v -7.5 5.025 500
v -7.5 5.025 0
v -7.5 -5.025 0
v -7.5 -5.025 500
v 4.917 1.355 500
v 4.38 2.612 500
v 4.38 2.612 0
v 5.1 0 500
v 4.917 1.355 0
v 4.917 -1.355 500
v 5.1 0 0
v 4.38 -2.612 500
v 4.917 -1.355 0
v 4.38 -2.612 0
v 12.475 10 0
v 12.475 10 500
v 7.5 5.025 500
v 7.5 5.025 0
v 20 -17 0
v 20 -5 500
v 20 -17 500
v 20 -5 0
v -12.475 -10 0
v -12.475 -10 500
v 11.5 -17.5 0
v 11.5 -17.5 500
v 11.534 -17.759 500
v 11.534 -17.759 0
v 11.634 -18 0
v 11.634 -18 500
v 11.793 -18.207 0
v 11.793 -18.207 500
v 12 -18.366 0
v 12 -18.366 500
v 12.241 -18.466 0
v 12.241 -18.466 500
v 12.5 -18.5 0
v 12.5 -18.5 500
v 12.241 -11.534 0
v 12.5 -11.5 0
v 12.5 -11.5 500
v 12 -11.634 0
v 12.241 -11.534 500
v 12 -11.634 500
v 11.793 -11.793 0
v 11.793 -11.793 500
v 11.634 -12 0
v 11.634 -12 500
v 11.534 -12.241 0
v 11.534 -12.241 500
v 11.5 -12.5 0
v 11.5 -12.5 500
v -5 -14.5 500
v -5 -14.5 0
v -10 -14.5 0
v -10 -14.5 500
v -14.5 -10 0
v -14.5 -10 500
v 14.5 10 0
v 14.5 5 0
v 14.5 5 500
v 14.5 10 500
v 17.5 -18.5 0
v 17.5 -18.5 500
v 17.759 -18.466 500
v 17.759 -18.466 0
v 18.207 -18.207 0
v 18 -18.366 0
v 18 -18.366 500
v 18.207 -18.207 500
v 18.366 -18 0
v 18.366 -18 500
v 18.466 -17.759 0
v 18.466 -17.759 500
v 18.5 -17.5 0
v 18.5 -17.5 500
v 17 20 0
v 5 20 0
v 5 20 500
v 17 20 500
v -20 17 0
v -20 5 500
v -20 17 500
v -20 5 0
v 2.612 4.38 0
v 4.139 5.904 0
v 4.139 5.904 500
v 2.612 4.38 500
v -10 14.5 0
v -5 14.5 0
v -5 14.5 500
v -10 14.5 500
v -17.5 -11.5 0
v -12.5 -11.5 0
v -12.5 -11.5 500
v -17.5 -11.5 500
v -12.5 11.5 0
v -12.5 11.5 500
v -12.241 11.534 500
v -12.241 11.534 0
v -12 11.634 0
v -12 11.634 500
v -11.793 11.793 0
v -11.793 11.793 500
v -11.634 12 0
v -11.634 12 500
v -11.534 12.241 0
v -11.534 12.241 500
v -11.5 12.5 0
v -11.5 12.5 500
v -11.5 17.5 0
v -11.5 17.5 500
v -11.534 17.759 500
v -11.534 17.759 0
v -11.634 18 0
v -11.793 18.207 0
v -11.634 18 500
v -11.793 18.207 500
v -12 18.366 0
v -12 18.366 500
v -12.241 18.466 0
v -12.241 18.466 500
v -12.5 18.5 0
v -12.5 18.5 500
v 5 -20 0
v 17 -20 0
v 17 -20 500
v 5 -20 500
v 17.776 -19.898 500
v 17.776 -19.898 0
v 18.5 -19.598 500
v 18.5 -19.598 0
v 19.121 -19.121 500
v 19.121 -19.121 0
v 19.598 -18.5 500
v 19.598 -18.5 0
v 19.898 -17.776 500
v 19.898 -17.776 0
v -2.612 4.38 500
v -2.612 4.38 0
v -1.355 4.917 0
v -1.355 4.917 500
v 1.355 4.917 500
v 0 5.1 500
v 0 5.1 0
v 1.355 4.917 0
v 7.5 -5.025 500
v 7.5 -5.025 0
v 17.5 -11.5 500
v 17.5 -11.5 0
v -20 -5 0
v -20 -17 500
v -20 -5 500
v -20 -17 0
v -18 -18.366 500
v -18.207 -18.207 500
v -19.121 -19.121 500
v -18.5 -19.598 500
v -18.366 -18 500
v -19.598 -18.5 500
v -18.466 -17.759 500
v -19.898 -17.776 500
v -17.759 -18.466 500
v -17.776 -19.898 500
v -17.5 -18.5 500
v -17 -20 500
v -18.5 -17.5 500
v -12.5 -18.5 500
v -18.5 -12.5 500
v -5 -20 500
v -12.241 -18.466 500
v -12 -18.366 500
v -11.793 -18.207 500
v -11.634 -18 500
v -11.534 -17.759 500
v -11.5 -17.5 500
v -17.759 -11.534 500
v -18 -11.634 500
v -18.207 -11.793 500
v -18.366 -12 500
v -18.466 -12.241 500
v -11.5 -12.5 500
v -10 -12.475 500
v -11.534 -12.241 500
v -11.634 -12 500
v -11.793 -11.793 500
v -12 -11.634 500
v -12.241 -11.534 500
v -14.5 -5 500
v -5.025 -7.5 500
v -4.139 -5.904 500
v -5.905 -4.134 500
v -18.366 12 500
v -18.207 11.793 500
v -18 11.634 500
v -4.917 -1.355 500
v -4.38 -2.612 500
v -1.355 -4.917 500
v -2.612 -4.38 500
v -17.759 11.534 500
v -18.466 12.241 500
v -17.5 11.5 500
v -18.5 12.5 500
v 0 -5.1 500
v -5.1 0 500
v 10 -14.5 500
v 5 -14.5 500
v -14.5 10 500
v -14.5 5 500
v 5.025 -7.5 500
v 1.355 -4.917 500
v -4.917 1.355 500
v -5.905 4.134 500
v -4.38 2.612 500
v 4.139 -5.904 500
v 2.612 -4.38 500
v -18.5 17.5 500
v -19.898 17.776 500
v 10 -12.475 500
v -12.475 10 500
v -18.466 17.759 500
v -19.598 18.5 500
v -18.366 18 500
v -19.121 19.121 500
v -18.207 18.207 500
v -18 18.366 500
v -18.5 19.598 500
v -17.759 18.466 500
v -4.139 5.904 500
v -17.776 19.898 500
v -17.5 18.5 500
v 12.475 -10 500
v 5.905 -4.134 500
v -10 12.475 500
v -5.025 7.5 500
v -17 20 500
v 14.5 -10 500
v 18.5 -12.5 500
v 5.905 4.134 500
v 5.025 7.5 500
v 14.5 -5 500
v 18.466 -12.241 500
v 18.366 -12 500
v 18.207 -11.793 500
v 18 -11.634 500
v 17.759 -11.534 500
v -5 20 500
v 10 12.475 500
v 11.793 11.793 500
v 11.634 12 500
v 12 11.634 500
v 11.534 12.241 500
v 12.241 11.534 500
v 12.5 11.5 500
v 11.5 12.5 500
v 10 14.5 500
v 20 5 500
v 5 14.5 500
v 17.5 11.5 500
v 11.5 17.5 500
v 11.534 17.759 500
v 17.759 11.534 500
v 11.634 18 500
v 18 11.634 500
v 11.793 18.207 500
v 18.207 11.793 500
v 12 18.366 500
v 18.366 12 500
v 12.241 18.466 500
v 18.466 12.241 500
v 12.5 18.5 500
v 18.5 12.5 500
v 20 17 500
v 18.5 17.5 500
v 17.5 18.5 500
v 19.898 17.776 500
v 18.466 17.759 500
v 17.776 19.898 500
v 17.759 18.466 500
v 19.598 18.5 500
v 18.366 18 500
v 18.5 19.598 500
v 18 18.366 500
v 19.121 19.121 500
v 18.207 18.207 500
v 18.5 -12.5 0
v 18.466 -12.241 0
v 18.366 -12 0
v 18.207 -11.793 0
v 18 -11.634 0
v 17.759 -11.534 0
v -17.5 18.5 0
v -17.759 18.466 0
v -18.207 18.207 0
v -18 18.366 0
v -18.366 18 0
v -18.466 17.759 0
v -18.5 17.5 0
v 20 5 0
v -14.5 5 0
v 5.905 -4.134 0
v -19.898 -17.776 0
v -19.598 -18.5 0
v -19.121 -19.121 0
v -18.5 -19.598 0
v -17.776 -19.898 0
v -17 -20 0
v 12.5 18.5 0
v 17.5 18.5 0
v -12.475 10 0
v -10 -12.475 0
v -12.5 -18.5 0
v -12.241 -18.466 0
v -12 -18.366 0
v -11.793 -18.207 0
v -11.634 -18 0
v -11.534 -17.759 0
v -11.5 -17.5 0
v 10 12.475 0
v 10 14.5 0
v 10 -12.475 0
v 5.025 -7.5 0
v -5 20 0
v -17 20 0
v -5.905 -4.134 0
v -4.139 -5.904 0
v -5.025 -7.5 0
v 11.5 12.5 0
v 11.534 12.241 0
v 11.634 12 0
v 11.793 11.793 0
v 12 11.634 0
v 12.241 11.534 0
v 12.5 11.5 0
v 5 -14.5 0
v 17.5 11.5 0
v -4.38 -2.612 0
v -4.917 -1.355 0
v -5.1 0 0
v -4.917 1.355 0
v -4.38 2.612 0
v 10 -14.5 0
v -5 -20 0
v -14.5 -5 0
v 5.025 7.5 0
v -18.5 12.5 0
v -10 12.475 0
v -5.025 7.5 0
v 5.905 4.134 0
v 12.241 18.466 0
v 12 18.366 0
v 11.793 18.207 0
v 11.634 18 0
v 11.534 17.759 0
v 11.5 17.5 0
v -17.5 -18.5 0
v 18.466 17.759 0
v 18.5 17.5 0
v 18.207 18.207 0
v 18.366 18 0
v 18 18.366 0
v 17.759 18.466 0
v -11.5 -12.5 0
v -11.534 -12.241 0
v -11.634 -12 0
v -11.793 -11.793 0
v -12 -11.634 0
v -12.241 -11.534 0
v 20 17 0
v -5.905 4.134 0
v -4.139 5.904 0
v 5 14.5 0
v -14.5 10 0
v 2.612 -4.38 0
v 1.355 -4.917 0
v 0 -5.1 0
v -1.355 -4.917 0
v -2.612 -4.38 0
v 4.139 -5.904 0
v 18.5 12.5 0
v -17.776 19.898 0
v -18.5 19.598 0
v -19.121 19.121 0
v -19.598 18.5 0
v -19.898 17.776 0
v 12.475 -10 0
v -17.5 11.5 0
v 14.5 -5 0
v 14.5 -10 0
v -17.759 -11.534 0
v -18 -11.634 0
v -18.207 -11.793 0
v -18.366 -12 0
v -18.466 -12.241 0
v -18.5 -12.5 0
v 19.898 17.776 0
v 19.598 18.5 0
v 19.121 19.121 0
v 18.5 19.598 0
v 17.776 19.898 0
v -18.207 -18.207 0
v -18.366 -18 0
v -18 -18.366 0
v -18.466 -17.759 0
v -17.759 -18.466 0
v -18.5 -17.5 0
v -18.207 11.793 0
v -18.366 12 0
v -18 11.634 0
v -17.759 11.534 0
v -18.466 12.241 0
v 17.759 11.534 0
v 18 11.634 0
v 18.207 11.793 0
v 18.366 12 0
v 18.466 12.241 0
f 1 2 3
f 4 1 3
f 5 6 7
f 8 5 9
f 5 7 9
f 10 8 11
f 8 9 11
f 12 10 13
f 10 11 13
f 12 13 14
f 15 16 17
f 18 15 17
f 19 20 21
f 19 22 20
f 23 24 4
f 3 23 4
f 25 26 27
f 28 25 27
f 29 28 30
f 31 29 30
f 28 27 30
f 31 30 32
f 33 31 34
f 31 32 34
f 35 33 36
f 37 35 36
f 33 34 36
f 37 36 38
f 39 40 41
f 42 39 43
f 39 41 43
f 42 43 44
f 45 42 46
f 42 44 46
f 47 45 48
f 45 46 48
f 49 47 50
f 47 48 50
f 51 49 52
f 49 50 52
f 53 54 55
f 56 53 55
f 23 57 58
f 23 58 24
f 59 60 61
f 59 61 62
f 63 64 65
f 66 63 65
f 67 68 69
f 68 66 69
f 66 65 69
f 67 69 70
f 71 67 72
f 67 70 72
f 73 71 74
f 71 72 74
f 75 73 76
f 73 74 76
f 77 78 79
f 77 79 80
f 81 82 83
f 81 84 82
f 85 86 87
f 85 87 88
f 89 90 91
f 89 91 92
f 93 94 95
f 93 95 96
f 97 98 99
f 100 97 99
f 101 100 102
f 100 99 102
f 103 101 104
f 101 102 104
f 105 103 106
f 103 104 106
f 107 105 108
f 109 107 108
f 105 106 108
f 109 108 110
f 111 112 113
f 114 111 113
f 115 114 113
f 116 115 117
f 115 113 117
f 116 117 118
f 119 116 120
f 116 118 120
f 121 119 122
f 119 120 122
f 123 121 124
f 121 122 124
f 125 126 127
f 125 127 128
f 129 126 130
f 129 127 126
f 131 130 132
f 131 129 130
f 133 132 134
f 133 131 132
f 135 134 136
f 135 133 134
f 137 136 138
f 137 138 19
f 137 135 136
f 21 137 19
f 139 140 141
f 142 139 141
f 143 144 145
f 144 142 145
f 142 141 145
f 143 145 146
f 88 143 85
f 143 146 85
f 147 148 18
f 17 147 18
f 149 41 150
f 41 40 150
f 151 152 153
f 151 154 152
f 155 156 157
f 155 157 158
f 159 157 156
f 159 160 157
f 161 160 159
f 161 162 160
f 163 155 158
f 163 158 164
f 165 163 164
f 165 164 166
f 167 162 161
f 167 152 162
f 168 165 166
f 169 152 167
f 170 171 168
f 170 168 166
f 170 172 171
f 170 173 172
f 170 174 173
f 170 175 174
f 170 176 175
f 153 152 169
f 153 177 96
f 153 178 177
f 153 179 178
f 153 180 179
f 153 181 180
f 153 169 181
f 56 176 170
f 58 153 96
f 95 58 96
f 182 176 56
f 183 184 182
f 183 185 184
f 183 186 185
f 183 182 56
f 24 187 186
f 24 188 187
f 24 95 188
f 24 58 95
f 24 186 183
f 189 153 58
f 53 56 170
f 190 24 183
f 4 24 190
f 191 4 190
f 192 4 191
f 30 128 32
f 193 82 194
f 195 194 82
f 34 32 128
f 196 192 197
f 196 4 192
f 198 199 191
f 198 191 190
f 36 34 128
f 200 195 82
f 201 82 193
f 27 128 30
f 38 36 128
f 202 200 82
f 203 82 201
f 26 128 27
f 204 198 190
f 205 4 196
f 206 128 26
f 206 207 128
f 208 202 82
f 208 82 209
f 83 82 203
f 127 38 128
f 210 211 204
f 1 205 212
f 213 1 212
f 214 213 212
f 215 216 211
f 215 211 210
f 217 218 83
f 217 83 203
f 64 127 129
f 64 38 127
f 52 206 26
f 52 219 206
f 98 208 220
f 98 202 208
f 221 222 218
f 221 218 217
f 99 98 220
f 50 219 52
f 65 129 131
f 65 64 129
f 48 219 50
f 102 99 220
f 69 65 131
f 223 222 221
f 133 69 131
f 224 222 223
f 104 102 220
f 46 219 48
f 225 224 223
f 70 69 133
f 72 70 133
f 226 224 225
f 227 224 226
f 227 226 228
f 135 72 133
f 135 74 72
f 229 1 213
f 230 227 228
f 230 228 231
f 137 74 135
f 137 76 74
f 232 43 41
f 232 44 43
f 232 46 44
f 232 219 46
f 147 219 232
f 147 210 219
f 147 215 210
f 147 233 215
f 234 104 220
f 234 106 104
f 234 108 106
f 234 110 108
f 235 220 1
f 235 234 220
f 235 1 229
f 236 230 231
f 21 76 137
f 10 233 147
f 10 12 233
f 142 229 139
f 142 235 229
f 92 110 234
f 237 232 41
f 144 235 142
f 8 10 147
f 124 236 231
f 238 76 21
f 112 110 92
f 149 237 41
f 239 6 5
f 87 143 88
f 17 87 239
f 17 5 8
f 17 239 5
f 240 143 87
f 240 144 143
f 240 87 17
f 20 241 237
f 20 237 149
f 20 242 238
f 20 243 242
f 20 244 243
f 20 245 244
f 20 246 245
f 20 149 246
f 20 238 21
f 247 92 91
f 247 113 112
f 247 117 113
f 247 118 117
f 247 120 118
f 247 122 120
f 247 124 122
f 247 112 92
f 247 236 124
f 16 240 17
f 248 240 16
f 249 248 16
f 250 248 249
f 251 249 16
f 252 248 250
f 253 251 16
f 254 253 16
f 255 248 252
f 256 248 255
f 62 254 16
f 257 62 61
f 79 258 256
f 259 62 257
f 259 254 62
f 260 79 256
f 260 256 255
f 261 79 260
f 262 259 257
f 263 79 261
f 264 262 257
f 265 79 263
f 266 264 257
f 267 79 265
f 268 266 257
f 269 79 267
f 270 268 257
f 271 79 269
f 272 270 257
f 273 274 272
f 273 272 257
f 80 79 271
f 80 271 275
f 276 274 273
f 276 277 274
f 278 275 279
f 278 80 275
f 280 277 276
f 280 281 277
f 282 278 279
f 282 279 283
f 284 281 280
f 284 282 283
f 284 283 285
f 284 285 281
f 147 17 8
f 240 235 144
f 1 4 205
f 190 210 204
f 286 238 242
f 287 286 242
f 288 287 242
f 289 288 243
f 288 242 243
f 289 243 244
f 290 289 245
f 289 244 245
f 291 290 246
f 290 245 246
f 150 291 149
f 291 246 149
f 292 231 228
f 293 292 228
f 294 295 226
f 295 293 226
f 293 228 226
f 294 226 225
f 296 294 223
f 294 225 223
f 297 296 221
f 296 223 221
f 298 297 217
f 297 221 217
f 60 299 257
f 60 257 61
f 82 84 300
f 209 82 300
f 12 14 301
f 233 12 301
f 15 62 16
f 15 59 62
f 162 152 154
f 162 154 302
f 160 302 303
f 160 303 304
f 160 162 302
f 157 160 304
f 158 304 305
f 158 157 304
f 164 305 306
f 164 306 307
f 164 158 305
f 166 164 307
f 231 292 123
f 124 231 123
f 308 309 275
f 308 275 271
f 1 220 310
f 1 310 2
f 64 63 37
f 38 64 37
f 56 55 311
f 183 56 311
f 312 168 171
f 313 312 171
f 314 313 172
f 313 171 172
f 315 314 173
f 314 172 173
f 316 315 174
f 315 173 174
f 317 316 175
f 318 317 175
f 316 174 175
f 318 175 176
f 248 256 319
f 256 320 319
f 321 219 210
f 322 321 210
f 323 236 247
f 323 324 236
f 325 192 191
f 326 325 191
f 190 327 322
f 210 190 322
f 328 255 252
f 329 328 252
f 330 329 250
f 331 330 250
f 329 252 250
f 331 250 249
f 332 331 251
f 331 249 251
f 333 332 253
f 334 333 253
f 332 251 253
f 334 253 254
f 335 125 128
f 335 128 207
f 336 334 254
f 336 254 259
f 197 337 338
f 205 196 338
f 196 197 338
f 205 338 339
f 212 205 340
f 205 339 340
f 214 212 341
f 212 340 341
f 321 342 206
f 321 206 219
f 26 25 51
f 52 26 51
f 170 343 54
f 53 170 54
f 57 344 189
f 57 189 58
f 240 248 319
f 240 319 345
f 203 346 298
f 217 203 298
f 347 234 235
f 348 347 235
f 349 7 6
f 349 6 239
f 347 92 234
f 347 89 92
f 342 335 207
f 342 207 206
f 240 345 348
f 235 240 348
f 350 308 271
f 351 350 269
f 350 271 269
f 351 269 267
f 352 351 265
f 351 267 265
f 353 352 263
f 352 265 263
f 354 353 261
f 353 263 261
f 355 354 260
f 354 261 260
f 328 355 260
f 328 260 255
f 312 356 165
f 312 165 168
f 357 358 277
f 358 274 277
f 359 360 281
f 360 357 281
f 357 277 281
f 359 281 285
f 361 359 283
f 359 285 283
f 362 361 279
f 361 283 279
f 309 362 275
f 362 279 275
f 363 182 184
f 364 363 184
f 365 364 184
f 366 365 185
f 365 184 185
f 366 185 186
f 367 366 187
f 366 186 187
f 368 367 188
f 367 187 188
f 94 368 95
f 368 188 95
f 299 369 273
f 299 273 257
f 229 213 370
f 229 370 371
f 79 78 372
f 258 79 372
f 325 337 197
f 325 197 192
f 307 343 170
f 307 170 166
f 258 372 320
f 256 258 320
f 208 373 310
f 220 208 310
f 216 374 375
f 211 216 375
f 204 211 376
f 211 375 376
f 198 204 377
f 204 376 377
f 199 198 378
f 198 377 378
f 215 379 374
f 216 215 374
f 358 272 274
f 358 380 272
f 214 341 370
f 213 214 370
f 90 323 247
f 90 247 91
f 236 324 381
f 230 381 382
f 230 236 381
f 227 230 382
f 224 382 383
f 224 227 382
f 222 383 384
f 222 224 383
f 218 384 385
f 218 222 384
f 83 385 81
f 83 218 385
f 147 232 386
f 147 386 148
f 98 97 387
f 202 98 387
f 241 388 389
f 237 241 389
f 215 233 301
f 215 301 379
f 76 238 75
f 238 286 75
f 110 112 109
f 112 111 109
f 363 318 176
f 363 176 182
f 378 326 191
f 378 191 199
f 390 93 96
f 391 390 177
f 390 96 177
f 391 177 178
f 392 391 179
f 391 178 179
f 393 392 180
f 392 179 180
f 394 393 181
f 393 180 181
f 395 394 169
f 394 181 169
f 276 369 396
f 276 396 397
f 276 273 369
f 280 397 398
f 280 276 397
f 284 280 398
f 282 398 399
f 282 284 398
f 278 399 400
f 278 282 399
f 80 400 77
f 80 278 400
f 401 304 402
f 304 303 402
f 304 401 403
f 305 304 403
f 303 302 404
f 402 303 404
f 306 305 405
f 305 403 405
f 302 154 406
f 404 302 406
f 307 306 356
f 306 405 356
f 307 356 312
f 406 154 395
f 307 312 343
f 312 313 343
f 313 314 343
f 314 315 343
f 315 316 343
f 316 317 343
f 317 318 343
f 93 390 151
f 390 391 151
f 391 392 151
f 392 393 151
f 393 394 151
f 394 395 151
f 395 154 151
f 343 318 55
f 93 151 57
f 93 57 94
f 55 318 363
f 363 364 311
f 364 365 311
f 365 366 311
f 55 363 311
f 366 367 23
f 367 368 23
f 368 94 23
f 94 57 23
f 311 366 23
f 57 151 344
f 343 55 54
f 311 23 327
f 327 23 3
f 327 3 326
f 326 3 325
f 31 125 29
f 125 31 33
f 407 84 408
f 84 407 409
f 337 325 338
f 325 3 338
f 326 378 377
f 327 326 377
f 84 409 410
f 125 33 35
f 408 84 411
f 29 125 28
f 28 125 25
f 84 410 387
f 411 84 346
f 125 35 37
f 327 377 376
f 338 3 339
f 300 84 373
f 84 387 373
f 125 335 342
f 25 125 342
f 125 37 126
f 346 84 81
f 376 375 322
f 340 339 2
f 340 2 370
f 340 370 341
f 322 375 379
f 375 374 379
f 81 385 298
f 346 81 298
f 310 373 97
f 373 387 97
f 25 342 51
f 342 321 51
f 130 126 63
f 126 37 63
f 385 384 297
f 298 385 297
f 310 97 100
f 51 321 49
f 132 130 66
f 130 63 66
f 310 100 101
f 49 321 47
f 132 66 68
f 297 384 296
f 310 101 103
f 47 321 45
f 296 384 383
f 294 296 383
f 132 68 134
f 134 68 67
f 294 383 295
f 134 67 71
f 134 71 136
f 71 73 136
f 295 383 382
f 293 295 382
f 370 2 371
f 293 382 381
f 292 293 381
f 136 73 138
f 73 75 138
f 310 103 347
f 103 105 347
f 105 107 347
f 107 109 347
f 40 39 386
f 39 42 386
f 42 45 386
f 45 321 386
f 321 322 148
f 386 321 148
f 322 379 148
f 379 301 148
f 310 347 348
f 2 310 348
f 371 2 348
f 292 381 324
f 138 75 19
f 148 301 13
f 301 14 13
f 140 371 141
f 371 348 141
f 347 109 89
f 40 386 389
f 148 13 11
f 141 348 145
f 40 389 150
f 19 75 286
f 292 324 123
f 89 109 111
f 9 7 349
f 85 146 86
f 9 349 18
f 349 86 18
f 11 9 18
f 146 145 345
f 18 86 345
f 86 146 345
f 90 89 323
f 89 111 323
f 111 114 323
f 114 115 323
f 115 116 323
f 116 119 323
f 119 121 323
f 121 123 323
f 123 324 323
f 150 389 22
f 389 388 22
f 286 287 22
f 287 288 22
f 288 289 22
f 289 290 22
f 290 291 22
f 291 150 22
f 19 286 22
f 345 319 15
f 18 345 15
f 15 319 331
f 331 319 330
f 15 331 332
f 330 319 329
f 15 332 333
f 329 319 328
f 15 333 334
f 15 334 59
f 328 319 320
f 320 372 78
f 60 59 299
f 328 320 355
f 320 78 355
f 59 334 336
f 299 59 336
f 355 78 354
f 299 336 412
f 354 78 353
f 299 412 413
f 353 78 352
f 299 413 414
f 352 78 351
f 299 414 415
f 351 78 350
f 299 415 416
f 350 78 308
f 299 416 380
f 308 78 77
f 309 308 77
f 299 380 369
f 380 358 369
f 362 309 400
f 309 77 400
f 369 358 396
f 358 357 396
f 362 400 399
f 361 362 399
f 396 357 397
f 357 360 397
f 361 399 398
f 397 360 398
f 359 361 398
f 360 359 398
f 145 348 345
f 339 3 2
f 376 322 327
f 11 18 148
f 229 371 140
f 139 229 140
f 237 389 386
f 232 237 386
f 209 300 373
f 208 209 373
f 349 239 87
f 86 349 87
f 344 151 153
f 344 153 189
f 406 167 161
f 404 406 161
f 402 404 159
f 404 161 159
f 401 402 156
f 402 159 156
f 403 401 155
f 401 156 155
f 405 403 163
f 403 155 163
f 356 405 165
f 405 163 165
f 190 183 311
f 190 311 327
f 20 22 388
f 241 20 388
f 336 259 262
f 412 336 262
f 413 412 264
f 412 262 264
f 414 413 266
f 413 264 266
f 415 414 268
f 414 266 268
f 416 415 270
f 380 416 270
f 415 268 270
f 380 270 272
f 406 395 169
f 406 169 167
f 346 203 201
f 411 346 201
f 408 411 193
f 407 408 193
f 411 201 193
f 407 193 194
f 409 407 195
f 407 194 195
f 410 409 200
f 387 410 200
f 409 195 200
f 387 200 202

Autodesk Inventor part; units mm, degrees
ref_plane "YZ Plane" through (0, 0, 0) normal (1, 0, 0) x (0, 1, 0)
ref_plane "XZ Plane" through (0, 0, 0) normal (0, 1, 0) x (-1, 0, 0)
ref_plane "XY Plane" through (0, 0, 0) normal (0, 0, 1) x (1, 0, 0)
sketch "T-Slot 4040 Base" plane through (0, 0, 0) normal (0, 0, 1) x (1, 0, 0)
  line L0 (-28, 0) -> (28, 0) construction
  line L1 (0, -28) -> (0, 28) construction
  circle A0 centre (0, 0) radius 5.1
  line L2 (-7.5, -7.5) -> (7.5, -7.5)
  line L3 (7.5, -7.5) -> (7.5, 7.5)
  line L4 (7.5, 7.5) -> (-7.5, 7.5)
  line L5 (-7.5, 7.5) -> (-7.5, -7.5)
  line L6 (-7.5, -7.5) -> (7.5, 7.5) construction
  line L7 (7.5, -7.5) -> (-7.5, 7.5) construction
  line L8 (-20, 20) -> (20, 20)
  line L9 (20, 20) -> (20, -20)
  line L10 (20, -20) -> (-20, -20)
  line L11 (-20, -20) -> (-20, 20)
  line L12 (-20, 20) -> (20, -20) construction
  line L13 (20, 20) -> (-20, -20) construction
  line L14 (20, 5) -> (14.5, 5)
  line L15 (14.5, 5) -> (14.5, 10)
  line L16 (14.5, 10) -> (12.4749, 10)
  line L17 (12.4749, 10) -> (7.5, 5.0251)
  line L18 (5, 20) -> (5, 14.5)
  line L19 (5, 14.5) -> (10, 14.5)
  line L20 (10, 14.5) -> (10, 12.4749)
  line L21 (10, 12.4749) -> (5.0251, 7.5)
  line L22 (18.5, 18.5) -> (11.5, 18.5)
  line L23 (11.5, 18.5) -> (11.5, 11.5)
  line L24 (11.5, 11.5) -> (18.5, 11.5)
  line L25 (18.5, 11.5) -> (18.5, 18.5)
  line L26 (18.5, 18.5) -> (11.5, 11.5) construction
  line L27 (11.5, 18.5) -> (18.5, 11.5) construction
  line L28 (3.0732, 1.3088) -> (4.38, 2.6125) construction
  line L29 (5.905, 4.1338) -> (4.1393, 5.9037)
  line L30 (4.1393, 5.9037) -> (2.6122, 4.3802)
  line L31 (1.3075, 3.0787) -> (3.0732, 1.3088) construction
  line L32 (3.0732, 1.3088) -> (4.1393, 5.9037) construction
  line L33 (5.905, 4.1338) -> (1.3075, 3.0787) construction
  line L34 (4.38, 2.6125) -> (5.905, 4.1338)
  line L35 (2.6122, 4.3802) -> (1.3075, 3.0787) construction
  line L36 (-20, 5) -> (-14.5, 5)
  line L37 (-14.5, 5) -> (-14.5, 10)
  line L38 (-14.5, 10) -> (-12.4749, 10)
  line L39 (-12.4749, 10) -> (-7.5, 5.0251)
  line L40 (-5, 20) -> (-5, 14.5)
  line L41 (-5, 14.5) -> (-10, 14.5)
  line L42 (-10, 14.5) -> (-10, 12.4749)
  line L43 (-10, 12.4749) -> (-5.0251, 7.5)
  line L44 (-18.5, 18.5) -> (-11.5, 18.5)
  line L45 (-11.5, 18.5) -> (-11.5, 11.5)
  line L46 (-11.5, 11.5) -> (-18.5, 11.5)
  line L47 (-18.5, 11.5) -> (-18.5, 18.5)
  line L48 (-5.905, 4.1338) -> (-4.1393, 5.9037)
  line L49 (-4.1393, 5.9037) -> (-2.6122, 4.3802)
  line L50 (-4.38, 2.6125) -> (-5.905, 4.1338)
  line L51 (7.5, -7.5) -> (-7.5, -7.5)
  line L52 (20, -5) -> (14.5, -5)
  line L53 (14.5, -5) -> (14.5, -10)
  line L54 (14.5, -10) -> (12.4749, -10)
  line L55 (12.4749, -10) -> (7.5, -5.0251)
  line L56 (5, -20) -> (5, -14.5)
  line L57 (5, -14.5) -> (10, -14.5)
  line L58 (10, -14.5) -> (10, -12.4749)
  line L59 (10, -12.4749) -> (5.0251, -7.5)
  line L60 (18.5, -18.5) -> (11.5, -18.5)
  line L61 (11.5, -18.5) -> (11.5, -11.5)
  line L62 (11.5, -11.5) -> (18.5, -11.5)
  line L63 (18.5, -11.5) -> (18.5, -18.5)
  line L64 (18.5, -18.5) -> (11.5, -11.5) construction
  line L65 (11.5, -18.5) -> (18.5, -11.5) construction
  line L66 (3.0732, -1.3088) -> (4.38, -2.6125) construction
  line L67 (5.905, -4.1338) -> (4.1393, -5.9037)
  line L68 (4.1393, -5.9037) -> (2.6122, -4.3802)
  line L69 (1.3075, -3.0787) -> (3.0732, -1.3088) construction
  line L70 (3.0732, -1.3088) -> (4.1393, -5.9037) construction
  line L71 (5.905, -4.1338) -> (1.3075, -3.0787) construction
  line L72 (4.38, -2.6125) -> (5.905, -4.1338)
  line L73 (2.6122, -4.3802) -> (1.3075, -3.0787) construction
  line L74 (-4.38, -2.6125) -> (-5.905, -4.1338)
  line L75 (-4.1393, -5.9037) -> (-2.6122, -4.3802)
  line L76 (-5.905, -4.1338) -> (-4.1393, -5.9037)
  line L77 (-12.4749, -10) -> (-7.5, -5.0251)
  line L78 (-10, -12.4749) -> (-5.0251, -7.5)
  line L79 (-10, -14.5) -> (-10, -12.4749)
  line L80 (-5, -14.5) -> (-10, -14.5)
  line L81 (-5, -20) -> (-5, -14.5)
  line L82 (-18.5, -18.5) -> (-11.5, -18.5)
  line L83 (-11.5, -18.5) -> (-11.5, -11.5)
  line L84 (-11.5, -11.5) -> (-18.5, -11.5)
  line L85 (-18.5, -11.5) -> (-18.5, -18.5)
  line L86 (-14.5, -10) -> (-12.4749, -10)
  line L87 (-14.5, -5) -> (-14.5, -10)
  line L88 (-20, -5) -> (-14.5, -5)
  point P0 (15, 15)
  point P1 (3.6062, 3.6062)
  point P2 (3.6062, 3.6062)
  point P3 (15, -15)
  point P4 (3.6062, -3.6062)
  point P5 (3.6062, -3.6062)
  dimension "d9" = 10.2
  dimension "d12" = 40
  dimension "d13" = 40
  dimension "d14" = 5.5
  dimension "d15" = 15
  dimension "d16" = 7
  dimension "d17" = 10
  dimension "d20" = 1.75
  dimension "d21" = 7
  dimension "d22" = 2
  dimension "d29" = 1.5
  dimension "d30" = 2.5
extrude "Extrusion1" add sketch "T-Slot 4040 Base" along normal blind 500 contours L5 L4 L3 L2 | L2 L78 L79 L80 L81 L10 L11 L88 L87 L86 L77 L5 | L2 L3 L55 L54 L53 L52 L9 L10 L56 L57 L58 L59 | L39 L38 L37 L36 L11 L8 L40 L41 L42 L43 L4 L5 | L3 L4 L21 L20 L19 L18 L8 L9 L14 L15 L16 L17
fillet "Rundung1" radius 1 16 edges at (11.5, 18.5, 250) (18.5, 18.5, 250) (18.5, 11.5, 250) (11.5, 11.5, 250) (-11.5, 18.5, 250) (-18.5, 18.5, 250) (-18.5, 11.5, 250) (-11.5, 11.5, 250) (-18.5, -11.5, 250) (-11.5, -11.5, 250) (-11.5, -18.5, 250) (-18.5, -18.5, 250) (11.5, -18.5, 250) (11.5, -11.5, 250) (18.5, -11.5, 250) (18.5, -18.5, 250)
fillet "Rundung2" radius 3 4 edges at (20, 20, 250) (20, -20, 250) (-20, -20, 250) (-20, 20, 250)
properties part number "T-SLOT 4040 B-Type 500mm"
